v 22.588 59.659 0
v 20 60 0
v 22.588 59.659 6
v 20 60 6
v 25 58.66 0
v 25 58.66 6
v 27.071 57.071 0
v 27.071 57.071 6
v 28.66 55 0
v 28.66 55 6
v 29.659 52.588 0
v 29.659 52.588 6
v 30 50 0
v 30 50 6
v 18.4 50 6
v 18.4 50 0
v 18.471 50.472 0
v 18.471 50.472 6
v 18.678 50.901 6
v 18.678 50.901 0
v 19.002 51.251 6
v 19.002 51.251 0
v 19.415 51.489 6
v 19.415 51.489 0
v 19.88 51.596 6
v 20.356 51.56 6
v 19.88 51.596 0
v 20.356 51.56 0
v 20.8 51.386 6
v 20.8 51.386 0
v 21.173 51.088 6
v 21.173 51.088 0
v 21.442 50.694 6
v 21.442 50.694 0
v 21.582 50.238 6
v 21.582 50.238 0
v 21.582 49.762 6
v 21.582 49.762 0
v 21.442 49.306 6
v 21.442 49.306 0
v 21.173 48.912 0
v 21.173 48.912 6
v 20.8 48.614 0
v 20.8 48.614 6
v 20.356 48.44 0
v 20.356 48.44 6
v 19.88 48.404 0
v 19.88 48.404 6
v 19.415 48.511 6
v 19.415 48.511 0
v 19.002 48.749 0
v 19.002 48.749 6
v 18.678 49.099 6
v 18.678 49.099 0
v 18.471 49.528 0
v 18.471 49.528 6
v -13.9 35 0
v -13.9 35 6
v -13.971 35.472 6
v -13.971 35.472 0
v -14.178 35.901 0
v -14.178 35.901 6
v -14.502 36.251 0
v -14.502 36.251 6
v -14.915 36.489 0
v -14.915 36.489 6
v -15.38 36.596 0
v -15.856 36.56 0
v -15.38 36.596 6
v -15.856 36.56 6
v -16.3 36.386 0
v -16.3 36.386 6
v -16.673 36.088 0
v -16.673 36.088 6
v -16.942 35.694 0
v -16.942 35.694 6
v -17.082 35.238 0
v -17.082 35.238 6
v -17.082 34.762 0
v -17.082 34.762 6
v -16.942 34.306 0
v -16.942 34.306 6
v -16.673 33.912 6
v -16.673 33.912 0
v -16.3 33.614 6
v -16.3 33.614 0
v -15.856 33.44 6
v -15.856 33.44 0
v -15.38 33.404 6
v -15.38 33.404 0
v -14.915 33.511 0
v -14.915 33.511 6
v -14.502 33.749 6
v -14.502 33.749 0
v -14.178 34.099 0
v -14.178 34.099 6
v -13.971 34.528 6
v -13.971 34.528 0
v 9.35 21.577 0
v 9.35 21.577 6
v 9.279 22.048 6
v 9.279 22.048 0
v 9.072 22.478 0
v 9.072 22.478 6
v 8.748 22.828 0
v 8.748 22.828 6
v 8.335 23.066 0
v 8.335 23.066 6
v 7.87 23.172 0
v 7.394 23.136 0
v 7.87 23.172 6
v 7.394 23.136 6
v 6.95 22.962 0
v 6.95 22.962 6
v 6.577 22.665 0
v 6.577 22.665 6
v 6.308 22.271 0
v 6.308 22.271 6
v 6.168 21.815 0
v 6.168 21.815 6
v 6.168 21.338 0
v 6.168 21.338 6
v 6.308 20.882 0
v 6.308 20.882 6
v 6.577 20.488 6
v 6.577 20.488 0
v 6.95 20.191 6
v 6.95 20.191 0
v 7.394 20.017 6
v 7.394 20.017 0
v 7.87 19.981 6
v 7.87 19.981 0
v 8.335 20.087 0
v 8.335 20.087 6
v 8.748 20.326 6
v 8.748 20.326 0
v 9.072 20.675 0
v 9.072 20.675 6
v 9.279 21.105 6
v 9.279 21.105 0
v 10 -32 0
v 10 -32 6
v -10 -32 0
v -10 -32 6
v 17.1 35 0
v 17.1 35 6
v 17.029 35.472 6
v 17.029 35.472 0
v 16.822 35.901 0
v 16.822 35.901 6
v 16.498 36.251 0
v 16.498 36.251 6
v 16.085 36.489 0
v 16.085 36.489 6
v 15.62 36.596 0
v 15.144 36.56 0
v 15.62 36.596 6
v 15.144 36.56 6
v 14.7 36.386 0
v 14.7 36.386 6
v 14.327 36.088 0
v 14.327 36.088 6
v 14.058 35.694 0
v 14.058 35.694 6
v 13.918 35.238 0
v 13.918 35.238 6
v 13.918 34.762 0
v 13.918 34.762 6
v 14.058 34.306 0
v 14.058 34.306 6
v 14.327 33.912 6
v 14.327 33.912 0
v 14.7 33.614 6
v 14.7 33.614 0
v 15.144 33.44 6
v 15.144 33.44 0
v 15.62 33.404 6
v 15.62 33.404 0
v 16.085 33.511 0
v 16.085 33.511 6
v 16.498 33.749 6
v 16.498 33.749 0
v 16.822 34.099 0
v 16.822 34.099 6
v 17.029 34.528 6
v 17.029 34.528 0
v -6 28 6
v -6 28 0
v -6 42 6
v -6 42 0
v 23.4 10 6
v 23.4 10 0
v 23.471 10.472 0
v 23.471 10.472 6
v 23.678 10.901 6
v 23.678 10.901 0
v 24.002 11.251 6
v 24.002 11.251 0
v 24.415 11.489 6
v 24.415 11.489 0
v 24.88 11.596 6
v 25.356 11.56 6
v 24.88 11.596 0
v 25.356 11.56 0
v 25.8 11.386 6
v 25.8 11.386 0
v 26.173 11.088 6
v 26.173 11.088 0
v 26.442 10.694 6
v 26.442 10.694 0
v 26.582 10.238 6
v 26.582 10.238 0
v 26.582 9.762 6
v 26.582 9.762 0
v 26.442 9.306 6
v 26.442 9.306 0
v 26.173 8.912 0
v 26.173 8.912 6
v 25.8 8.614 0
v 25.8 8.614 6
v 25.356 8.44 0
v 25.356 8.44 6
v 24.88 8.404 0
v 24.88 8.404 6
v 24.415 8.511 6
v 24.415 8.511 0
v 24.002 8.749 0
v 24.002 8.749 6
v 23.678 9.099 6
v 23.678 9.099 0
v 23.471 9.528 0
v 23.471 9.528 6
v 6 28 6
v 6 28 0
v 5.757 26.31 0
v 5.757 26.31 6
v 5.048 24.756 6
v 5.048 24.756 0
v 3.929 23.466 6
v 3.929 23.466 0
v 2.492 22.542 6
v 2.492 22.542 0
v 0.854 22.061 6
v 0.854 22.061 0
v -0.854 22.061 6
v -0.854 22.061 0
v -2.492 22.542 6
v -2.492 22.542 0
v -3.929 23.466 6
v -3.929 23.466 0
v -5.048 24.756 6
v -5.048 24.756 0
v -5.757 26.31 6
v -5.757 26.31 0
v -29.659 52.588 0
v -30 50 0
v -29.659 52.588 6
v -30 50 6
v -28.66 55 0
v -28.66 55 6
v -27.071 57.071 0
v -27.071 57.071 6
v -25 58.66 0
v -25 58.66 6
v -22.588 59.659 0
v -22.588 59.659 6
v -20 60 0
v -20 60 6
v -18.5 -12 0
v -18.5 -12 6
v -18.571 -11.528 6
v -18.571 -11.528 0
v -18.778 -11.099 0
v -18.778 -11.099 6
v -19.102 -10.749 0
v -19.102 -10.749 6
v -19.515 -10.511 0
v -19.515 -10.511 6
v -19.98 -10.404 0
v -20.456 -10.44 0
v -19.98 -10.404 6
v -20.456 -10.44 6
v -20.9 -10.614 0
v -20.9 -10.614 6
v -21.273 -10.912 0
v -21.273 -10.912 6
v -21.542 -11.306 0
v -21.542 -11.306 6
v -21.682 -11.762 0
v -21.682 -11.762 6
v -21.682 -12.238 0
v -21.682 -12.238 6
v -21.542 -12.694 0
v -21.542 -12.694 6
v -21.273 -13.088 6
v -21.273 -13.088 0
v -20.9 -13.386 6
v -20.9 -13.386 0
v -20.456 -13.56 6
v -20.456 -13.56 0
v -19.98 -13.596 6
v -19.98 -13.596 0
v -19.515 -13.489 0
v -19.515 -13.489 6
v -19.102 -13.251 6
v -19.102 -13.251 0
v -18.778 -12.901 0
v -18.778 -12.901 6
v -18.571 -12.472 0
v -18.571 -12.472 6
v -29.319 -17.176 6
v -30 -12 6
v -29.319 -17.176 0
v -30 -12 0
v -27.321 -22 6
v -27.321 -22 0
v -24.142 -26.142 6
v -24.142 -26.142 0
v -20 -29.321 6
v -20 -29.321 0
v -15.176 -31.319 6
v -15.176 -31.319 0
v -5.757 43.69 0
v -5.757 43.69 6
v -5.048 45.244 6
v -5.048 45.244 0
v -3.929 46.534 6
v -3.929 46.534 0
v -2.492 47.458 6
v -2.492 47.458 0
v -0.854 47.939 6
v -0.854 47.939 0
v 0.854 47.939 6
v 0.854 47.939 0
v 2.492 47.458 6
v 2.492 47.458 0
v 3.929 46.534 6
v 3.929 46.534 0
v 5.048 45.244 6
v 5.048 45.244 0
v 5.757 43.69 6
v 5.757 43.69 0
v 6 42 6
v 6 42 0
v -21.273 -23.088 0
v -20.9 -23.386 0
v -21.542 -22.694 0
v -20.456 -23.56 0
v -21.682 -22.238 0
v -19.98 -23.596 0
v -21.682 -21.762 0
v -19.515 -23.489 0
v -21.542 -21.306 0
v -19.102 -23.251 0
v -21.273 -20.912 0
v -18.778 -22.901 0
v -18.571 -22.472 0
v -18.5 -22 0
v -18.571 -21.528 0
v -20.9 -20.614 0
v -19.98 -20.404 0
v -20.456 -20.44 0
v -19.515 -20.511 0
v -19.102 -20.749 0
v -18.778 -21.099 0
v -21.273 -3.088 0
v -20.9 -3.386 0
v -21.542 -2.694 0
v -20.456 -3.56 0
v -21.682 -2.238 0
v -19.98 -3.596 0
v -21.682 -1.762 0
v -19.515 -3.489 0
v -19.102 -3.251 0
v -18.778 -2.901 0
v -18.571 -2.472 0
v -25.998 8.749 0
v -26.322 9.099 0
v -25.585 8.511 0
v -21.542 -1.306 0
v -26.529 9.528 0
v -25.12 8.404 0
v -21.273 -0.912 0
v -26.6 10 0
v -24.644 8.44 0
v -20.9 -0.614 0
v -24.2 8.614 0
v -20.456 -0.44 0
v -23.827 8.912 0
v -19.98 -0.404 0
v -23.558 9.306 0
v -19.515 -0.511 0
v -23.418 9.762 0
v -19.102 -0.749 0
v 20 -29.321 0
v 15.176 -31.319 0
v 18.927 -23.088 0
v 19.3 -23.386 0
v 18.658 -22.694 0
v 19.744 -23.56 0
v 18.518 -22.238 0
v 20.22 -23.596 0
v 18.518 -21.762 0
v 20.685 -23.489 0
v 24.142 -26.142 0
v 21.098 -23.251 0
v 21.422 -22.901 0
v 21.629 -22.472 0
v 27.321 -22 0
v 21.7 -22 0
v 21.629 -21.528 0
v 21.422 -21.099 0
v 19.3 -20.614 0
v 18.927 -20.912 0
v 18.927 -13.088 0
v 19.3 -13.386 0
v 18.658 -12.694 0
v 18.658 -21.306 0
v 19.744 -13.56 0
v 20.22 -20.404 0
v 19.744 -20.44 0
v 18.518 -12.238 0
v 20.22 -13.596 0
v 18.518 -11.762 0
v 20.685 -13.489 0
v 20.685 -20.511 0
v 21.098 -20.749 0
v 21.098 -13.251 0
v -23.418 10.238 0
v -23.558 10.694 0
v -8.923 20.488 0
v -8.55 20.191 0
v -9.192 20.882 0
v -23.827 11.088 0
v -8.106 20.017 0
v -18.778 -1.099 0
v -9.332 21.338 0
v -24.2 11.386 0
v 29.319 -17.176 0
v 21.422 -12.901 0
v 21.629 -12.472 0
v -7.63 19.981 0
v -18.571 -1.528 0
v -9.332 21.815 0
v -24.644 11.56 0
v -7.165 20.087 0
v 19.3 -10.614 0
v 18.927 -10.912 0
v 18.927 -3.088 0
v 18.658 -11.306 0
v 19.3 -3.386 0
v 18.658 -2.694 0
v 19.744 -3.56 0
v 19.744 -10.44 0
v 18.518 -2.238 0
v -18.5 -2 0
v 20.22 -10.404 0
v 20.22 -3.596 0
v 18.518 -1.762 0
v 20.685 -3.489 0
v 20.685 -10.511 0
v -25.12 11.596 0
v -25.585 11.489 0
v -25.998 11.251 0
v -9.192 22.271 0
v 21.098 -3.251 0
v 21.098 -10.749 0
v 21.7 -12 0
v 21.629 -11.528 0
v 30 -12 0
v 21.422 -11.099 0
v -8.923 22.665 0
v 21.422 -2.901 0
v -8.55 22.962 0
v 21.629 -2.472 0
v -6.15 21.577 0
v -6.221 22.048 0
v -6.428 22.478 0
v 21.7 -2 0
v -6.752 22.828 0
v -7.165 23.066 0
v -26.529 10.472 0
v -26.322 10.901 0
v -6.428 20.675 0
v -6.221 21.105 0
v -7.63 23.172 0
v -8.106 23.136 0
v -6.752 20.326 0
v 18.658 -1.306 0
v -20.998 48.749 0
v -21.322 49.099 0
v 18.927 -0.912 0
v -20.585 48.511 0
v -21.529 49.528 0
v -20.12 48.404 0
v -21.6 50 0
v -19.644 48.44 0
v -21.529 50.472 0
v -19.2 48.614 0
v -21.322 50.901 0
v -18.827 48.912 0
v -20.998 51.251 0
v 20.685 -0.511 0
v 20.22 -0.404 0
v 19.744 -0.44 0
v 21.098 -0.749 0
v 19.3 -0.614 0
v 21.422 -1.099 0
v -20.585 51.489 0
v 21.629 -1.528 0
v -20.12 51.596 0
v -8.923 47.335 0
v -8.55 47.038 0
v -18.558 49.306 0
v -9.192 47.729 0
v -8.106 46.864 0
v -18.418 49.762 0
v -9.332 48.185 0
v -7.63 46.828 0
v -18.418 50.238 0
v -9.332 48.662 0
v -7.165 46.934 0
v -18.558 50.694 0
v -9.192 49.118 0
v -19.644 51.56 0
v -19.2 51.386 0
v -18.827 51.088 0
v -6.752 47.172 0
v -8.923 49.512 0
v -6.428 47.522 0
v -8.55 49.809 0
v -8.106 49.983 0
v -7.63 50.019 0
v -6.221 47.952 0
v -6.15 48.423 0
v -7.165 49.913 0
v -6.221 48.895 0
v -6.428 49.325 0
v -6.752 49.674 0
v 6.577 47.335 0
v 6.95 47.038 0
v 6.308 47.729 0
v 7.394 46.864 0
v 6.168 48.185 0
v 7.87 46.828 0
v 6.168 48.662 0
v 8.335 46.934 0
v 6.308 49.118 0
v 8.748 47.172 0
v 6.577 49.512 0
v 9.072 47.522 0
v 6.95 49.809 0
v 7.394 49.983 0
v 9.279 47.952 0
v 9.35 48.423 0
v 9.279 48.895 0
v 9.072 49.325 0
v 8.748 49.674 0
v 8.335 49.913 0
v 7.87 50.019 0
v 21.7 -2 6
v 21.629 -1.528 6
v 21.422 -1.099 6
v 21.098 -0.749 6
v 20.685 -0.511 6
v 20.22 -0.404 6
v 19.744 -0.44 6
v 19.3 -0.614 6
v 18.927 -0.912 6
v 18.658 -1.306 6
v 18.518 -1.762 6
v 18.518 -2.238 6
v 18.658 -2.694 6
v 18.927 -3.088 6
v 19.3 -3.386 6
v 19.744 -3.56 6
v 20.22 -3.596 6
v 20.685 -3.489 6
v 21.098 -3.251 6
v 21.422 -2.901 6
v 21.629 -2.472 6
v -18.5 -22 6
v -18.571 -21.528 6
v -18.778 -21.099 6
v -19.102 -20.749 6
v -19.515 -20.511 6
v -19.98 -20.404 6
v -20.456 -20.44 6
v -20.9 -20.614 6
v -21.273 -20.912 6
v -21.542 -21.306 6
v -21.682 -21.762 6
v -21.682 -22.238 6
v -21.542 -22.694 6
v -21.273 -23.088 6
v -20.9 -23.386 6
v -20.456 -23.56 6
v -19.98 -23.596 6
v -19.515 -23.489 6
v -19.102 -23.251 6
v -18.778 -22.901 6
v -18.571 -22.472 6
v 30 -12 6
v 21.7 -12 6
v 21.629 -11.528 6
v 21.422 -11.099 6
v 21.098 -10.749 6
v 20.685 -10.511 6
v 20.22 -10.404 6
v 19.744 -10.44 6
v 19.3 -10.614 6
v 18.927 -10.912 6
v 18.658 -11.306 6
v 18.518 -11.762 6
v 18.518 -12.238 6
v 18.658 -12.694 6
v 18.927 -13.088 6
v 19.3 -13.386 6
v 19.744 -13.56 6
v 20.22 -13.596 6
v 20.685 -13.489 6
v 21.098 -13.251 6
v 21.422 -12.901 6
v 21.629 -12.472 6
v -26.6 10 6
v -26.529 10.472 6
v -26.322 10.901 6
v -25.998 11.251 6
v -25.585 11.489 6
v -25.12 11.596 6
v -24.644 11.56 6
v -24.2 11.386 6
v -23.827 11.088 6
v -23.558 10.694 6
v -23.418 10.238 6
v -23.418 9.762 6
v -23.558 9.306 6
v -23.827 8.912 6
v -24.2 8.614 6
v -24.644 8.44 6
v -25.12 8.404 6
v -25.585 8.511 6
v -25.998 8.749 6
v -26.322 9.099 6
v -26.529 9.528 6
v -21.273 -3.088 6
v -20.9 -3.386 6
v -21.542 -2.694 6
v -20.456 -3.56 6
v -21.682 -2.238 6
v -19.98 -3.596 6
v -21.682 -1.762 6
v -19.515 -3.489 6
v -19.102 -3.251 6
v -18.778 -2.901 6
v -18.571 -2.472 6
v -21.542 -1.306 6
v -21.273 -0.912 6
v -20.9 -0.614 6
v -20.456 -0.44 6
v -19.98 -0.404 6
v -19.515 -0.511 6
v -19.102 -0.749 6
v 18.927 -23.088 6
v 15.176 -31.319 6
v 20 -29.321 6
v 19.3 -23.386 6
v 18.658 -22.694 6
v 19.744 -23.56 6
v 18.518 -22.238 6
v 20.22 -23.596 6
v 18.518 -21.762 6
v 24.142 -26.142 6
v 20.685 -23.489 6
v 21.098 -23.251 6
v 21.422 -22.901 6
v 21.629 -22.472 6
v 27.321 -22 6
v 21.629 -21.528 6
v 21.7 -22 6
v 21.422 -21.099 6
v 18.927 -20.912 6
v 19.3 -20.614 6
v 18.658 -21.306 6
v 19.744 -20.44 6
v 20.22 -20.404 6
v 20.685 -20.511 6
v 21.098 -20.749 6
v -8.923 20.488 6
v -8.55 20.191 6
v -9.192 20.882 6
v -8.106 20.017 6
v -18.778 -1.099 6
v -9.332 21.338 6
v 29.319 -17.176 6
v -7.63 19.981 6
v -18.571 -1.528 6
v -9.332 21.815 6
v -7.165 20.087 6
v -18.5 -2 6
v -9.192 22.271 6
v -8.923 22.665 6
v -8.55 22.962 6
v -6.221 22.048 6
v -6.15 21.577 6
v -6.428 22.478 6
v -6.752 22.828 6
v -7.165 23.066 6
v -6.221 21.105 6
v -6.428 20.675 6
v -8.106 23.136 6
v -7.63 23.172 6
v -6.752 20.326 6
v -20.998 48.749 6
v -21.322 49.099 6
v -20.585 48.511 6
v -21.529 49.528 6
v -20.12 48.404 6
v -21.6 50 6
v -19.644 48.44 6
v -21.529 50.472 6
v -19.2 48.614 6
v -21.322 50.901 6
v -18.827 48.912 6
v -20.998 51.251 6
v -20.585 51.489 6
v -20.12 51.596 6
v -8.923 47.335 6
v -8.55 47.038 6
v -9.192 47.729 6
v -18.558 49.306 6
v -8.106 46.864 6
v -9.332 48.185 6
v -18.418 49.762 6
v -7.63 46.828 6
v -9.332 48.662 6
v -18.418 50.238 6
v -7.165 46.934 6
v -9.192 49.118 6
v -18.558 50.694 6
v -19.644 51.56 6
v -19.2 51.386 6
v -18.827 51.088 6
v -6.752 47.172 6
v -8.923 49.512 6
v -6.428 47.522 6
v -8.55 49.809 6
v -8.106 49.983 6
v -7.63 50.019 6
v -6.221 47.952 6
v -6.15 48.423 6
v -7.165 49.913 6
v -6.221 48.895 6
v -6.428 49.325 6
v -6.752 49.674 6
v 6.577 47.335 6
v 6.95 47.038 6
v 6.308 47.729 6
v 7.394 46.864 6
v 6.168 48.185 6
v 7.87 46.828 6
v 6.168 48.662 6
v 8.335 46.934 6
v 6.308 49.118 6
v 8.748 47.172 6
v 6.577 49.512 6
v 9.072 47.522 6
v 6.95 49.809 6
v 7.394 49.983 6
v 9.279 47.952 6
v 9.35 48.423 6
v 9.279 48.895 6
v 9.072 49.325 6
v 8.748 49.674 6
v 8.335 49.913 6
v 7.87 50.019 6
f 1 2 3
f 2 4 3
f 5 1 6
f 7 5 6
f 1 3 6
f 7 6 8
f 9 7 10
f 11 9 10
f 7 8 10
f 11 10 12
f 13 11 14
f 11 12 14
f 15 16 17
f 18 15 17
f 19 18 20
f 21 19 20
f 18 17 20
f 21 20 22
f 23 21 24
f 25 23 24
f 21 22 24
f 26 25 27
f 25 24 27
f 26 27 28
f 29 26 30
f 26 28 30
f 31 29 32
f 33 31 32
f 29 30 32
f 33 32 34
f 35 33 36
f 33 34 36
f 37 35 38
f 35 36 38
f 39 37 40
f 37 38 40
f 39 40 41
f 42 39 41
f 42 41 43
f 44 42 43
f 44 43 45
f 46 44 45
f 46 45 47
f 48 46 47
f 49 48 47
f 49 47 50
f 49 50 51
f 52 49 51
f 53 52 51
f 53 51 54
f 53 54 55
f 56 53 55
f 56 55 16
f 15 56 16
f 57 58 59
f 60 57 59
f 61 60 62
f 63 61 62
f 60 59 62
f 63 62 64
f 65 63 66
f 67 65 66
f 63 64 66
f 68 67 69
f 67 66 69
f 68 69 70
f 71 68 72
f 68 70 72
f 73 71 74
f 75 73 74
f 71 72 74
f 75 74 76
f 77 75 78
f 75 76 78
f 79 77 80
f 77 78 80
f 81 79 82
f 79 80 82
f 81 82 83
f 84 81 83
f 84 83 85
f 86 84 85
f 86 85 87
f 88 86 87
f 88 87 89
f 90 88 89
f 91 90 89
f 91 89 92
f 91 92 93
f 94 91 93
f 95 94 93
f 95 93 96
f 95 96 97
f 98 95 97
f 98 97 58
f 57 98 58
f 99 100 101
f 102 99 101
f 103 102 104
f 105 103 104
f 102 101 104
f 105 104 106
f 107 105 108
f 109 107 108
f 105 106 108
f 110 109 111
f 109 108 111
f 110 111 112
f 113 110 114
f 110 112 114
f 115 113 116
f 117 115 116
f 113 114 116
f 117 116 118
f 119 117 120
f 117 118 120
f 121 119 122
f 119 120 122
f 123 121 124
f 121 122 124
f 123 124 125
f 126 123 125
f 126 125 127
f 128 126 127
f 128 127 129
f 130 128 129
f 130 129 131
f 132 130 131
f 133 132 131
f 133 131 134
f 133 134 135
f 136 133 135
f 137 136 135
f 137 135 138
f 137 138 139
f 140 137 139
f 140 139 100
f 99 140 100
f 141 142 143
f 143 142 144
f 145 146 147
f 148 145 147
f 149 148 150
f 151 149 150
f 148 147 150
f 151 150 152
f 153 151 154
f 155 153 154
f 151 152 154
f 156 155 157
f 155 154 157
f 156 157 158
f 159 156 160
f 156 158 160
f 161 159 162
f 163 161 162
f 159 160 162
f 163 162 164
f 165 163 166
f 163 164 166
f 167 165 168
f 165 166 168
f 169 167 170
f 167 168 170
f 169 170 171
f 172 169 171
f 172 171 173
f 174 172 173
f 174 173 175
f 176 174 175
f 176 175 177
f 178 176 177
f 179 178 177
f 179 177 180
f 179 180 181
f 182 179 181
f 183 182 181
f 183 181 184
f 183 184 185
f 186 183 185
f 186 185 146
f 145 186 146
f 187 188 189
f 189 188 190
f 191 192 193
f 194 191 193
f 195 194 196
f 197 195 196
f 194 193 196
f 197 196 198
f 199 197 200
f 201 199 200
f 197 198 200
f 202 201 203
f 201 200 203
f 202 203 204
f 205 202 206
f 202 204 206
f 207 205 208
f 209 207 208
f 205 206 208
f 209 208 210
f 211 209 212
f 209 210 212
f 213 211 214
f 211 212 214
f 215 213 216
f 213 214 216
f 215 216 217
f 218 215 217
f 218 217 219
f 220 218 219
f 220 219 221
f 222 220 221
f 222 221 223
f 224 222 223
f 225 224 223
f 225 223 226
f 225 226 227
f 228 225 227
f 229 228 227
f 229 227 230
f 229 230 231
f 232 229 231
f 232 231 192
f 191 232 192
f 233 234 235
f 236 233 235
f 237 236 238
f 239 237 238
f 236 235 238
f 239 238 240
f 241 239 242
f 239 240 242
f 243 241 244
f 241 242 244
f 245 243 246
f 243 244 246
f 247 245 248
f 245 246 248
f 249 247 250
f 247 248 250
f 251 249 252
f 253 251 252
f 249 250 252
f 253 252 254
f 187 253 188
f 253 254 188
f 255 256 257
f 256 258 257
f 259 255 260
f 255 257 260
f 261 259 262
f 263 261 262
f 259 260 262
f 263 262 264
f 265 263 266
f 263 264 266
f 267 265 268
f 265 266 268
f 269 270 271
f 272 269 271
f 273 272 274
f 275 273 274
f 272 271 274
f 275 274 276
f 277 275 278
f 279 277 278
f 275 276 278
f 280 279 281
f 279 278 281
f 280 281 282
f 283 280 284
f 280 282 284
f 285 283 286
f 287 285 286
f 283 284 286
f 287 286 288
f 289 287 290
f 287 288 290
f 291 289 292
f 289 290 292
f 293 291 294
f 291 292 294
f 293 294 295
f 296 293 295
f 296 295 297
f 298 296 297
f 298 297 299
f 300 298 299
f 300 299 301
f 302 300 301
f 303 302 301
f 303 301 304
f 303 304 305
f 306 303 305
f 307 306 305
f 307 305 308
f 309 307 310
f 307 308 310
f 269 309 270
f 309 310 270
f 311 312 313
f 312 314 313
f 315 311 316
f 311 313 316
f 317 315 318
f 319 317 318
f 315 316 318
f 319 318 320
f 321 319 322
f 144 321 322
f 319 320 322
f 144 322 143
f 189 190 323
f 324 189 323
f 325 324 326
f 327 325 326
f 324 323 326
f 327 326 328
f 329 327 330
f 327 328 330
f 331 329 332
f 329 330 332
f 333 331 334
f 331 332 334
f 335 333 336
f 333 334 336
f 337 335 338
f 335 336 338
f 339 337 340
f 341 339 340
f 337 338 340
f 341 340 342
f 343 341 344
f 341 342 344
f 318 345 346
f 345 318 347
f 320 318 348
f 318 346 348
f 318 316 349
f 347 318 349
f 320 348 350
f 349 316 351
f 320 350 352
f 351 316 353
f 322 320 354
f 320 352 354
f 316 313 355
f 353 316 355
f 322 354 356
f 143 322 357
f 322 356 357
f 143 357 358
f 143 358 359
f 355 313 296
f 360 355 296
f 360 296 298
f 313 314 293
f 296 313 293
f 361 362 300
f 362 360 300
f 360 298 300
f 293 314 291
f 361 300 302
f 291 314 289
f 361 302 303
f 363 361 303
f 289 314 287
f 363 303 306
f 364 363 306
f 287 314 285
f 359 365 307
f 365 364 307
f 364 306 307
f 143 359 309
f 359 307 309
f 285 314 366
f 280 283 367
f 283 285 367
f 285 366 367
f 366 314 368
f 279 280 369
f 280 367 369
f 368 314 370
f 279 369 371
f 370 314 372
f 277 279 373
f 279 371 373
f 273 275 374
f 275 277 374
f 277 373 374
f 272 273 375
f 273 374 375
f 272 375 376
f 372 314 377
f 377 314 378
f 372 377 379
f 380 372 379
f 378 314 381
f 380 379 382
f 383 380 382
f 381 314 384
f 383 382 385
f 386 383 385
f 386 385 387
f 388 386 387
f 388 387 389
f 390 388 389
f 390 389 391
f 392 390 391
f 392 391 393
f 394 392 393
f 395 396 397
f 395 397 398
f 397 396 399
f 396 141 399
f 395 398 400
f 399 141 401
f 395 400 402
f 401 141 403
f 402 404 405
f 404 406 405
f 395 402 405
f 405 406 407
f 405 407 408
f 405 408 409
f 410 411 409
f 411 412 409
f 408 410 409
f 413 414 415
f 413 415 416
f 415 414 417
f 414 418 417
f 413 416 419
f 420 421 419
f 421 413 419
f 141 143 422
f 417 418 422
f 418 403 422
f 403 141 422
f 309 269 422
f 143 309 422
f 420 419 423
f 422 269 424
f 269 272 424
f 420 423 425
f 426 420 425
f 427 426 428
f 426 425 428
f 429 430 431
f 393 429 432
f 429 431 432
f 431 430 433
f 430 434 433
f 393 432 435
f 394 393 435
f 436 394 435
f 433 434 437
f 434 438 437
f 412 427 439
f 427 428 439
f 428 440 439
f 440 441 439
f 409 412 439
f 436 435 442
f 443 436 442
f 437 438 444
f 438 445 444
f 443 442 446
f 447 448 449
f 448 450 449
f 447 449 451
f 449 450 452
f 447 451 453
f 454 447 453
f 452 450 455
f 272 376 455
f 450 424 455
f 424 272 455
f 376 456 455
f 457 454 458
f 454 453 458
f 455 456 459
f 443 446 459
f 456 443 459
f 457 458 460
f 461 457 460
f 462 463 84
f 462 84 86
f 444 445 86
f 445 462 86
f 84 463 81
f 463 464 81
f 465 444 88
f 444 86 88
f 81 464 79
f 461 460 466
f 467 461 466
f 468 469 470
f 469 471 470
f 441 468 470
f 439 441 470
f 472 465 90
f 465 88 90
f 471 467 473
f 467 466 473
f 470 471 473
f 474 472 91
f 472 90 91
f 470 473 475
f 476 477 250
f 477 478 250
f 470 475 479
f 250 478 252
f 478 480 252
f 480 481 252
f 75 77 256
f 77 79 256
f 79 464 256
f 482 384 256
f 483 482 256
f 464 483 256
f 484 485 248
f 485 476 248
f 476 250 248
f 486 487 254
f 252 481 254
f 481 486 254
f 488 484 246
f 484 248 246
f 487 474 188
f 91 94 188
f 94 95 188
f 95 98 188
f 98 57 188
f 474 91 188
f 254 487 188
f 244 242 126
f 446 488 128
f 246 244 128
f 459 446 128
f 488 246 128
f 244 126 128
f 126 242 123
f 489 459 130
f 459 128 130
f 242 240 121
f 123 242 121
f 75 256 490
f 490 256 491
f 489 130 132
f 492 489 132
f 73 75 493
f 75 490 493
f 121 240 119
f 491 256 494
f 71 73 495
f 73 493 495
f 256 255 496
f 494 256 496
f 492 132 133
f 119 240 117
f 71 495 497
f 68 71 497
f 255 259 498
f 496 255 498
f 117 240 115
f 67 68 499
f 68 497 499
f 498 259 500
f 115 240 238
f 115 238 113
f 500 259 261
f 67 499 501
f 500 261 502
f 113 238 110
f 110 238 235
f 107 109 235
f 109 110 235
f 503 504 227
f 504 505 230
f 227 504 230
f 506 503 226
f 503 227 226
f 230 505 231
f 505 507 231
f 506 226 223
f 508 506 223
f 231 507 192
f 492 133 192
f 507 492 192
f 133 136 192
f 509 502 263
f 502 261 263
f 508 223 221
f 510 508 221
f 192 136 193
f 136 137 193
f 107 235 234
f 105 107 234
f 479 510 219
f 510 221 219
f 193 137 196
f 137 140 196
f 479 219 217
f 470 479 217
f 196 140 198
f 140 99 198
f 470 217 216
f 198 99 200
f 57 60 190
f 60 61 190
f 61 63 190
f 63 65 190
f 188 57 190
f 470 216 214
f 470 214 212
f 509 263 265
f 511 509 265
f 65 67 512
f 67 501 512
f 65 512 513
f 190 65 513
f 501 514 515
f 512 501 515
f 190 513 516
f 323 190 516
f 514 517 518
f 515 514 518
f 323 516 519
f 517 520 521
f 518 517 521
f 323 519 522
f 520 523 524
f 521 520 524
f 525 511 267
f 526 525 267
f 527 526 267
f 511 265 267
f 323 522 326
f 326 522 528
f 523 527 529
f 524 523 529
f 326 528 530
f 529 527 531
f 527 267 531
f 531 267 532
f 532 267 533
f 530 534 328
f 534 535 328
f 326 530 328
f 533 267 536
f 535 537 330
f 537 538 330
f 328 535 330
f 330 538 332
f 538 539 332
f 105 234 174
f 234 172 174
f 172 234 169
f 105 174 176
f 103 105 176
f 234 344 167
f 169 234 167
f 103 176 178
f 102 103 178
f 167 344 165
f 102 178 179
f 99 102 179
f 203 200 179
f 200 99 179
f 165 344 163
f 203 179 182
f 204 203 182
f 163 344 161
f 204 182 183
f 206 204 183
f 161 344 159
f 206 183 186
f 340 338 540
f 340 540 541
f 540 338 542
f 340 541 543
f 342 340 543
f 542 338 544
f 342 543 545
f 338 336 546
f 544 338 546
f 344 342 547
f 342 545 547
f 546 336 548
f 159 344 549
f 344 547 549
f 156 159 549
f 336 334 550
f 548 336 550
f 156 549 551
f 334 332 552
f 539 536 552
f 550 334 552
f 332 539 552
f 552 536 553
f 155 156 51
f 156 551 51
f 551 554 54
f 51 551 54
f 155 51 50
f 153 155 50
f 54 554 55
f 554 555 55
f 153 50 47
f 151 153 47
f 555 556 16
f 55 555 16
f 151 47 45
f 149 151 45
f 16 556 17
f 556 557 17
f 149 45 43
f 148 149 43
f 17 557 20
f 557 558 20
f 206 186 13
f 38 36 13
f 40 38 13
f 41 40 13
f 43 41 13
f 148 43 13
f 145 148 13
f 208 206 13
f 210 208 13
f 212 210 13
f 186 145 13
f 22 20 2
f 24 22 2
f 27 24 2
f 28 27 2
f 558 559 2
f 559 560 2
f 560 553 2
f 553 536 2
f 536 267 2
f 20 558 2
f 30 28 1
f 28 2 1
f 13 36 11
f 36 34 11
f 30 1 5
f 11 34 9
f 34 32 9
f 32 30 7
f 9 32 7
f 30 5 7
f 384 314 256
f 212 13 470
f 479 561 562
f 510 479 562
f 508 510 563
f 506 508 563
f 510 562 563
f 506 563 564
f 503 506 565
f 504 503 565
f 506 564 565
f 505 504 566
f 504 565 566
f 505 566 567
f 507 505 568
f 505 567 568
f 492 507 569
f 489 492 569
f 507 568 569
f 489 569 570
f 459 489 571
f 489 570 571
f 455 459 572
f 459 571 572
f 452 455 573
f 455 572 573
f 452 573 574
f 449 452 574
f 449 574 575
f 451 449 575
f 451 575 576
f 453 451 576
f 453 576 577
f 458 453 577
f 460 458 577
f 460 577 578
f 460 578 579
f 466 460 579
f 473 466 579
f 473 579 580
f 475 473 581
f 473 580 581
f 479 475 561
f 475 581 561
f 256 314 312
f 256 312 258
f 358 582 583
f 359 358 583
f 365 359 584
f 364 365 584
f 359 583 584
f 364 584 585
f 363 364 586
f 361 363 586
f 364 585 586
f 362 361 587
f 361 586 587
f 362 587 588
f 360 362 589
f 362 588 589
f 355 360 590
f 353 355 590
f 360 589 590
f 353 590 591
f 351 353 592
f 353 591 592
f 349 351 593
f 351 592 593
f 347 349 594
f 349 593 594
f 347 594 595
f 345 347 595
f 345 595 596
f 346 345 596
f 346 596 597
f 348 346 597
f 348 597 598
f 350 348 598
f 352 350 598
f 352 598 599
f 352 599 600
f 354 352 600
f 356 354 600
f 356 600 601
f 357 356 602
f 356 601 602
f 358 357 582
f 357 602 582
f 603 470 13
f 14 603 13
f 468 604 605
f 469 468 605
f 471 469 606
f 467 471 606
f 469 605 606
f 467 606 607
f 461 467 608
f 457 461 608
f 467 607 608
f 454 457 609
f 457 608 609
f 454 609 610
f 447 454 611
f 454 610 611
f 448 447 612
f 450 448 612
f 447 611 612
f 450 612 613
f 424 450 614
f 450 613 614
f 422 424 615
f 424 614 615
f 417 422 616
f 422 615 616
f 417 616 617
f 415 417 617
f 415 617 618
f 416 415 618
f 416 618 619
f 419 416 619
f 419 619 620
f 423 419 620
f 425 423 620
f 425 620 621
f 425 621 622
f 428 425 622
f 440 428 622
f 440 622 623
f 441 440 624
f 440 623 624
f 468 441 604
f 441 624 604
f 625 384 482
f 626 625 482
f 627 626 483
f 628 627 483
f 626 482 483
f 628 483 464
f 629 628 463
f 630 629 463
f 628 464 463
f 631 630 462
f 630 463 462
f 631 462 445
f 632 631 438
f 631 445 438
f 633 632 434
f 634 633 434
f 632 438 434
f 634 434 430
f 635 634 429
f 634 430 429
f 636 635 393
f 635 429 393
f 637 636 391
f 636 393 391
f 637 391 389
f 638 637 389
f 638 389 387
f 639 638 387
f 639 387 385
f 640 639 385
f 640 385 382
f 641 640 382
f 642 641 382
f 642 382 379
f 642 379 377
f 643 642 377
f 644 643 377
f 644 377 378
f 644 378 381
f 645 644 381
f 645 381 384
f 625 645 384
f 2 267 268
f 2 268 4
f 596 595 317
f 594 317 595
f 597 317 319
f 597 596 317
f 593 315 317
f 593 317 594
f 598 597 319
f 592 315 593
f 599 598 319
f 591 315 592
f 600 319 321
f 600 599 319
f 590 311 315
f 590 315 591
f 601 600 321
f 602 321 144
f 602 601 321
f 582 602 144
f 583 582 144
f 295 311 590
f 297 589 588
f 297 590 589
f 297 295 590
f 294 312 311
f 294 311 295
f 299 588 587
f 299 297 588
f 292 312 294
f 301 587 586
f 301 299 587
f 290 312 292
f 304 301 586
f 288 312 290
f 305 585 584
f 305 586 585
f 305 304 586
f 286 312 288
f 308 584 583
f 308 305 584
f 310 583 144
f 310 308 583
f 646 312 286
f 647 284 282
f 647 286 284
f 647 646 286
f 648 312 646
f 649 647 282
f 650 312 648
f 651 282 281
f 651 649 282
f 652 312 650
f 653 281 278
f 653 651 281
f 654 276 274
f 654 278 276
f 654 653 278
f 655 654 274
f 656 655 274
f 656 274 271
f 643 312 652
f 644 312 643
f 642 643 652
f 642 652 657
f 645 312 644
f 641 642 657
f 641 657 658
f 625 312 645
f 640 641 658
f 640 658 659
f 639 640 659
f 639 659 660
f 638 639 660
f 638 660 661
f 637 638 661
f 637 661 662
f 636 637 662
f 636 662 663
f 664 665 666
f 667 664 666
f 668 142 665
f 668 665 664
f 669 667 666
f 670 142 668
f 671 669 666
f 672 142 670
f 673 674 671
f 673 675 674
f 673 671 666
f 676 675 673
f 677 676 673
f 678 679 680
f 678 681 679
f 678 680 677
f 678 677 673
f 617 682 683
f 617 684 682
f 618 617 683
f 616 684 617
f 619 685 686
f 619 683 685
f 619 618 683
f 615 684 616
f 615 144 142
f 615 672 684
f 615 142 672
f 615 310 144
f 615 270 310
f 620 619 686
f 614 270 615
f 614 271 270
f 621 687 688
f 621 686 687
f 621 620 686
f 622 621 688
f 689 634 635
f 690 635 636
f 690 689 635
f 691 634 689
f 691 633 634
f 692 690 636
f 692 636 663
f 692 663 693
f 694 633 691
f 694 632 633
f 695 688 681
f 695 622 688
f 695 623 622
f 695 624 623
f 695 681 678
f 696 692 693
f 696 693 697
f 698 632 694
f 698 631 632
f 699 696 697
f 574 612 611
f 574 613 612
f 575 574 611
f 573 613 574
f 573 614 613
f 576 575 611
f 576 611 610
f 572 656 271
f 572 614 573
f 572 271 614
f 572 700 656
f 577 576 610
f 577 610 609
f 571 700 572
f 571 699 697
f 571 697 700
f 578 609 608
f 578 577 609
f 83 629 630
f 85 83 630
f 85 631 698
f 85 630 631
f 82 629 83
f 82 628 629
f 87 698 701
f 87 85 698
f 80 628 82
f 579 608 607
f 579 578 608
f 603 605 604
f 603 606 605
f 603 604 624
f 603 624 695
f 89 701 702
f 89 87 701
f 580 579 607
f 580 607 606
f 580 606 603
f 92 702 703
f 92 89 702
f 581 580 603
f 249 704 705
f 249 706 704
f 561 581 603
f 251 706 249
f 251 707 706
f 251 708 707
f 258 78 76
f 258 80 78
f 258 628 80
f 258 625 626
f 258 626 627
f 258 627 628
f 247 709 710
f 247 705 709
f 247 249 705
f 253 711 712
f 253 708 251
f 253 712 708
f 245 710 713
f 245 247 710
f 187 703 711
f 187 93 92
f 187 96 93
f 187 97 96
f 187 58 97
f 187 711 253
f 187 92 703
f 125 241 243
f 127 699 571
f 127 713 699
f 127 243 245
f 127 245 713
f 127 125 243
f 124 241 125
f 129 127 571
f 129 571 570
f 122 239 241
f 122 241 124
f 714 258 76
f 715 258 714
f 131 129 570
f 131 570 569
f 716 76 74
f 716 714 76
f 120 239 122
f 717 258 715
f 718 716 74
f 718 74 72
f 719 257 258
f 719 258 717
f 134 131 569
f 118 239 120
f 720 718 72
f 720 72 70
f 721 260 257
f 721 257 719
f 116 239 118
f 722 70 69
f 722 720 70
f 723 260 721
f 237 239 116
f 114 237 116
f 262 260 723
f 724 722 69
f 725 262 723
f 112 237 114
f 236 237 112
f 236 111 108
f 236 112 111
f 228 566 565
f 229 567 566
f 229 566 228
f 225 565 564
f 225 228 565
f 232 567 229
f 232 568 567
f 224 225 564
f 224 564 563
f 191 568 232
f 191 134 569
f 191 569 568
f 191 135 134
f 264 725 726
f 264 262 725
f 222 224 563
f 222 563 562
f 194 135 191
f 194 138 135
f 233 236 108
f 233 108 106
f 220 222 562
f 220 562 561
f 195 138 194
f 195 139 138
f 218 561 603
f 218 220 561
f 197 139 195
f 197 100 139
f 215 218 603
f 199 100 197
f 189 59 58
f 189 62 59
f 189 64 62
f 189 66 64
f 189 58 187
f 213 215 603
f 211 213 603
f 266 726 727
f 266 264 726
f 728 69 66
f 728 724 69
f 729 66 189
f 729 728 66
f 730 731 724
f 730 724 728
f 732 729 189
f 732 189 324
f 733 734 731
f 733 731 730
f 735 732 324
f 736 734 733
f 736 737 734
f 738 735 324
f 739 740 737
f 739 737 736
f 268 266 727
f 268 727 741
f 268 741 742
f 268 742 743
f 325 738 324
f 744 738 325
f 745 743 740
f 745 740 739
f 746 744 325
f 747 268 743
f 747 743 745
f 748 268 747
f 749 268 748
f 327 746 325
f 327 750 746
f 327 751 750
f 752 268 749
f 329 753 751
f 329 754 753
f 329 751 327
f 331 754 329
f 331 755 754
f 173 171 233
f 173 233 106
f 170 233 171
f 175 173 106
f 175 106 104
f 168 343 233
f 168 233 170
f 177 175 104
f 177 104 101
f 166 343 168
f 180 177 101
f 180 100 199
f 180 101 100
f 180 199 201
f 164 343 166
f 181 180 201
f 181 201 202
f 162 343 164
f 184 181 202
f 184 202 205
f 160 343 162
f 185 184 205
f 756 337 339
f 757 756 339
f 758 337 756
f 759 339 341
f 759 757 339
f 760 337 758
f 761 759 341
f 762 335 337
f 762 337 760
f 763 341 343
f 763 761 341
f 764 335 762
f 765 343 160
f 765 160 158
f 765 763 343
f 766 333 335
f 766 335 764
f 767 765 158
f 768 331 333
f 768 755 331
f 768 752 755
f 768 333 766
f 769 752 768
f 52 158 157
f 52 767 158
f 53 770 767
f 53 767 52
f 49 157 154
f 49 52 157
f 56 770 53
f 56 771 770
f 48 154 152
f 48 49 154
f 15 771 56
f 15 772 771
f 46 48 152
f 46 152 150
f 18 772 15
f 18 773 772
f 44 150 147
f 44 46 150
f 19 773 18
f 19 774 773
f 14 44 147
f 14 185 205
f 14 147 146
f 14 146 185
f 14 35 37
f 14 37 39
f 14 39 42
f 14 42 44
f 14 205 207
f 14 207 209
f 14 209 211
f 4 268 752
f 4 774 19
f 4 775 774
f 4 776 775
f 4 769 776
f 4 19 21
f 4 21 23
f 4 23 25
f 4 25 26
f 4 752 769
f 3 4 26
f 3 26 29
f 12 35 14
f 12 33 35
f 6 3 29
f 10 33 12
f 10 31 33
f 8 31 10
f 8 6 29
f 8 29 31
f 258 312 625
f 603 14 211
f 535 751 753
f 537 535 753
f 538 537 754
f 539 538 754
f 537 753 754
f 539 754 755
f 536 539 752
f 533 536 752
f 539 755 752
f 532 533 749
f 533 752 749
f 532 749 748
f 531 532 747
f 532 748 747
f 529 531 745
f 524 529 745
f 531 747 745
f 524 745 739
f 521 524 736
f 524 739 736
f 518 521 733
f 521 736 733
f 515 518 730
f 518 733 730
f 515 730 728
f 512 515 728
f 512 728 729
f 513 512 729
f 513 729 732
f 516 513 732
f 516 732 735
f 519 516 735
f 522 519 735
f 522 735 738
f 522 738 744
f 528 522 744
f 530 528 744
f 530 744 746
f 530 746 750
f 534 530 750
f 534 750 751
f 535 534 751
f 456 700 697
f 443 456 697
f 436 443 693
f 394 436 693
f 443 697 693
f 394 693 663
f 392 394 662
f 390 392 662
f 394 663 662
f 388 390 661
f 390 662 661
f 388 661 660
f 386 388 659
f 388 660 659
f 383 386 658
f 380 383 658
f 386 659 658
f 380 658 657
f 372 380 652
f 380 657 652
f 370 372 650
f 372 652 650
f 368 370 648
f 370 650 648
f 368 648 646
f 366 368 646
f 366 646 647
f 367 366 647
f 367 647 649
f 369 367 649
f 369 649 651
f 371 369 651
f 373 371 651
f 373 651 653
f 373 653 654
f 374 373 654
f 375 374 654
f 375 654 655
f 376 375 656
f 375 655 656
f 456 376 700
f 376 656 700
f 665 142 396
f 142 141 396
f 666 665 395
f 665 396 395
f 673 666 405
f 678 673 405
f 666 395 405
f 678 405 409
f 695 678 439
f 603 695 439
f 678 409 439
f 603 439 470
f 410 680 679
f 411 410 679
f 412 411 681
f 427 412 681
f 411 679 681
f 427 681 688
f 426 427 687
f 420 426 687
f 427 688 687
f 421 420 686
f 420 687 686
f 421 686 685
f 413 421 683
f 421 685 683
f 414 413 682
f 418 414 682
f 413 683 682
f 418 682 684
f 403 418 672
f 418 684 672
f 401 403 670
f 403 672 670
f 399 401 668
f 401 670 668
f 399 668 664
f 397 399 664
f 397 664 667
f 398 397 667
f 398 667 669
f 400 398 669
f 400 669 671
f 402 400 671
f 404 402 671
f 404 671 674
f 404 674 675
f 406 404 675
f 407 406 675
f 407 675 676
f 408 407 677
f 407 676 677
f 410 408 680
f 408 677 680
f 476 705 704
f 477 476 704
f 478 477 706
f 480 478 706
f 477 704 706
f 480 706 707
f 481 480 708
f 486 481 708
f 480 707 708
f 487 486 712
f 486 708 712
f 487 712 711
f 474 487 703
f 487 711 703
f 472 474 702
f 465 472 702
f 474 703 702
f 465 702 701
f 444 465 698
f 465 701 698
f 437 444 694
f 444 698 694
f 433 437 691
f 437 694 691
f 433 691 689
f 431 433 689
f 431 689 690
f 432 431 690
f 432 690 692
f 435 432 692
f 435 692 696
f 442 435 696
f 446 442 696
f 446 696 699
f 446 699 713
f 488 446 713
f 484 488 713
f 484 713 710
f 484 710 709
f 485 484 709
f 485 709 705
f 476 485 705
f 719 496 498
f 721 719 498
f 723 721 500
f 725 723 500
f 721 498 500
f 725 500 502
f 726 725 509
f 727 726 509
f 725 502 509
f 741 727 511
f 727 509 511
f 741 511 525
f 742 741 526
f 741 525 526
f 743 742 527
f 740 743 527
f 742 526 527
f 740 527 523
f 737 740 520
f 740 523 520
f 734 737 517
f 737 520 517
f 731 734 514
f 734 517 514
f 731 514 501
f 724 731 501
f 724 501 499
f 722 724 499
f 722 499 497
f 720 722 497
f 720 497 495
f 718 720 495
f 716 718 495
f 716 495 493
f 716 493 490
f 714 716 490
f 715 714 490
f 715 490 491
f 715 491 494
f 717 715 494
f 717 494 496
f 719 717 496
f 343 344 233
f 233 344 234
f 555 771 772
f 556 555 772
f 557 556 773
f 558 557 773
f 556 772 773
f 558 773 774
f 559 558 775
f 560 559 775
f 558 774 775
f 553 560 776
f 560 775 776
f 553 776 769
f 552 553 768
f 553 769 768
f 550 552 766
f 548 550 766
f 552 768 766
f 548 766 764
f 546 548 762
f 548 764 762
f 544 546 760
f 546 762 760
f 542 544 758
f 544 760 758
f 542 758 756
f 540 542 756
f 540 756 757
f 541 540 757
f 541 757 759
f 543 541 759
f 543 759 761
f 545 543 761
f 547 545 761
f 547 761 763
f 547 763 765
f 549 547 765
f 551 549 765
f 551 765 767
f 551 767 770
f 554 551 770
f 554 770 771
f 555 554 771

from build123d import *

# Parameters (mm, degrees)
SKETCH_1_W          = 60
SKETCH_1_H          = 120
SKETCH_1_R          = 1.6
SKETCH_1_R_2        = 2.15
EXTRUDE_3_DEPTH     = 6
SKETCH_9_R          = 1.6
CUT_EXTRUDE_1_DEPTH = 6
FILLET_1_R          = 10
SKETCH_11_R         = 2.15
CUT_EXTRUDE_2_DEPTH = 6
FILLET_2_R          = 20
SKETCH_12_R         = 1.6
CUT_EXTRUDE_3_DEPTH = 10
SKETCH_13_R         = 1.6
CUT_EXTRUDE_4_DEPTH = 10
EXTRUDE_START       = -6
SKETCH_14_R         = 1.6
EXTRUDE_5_DEPTH     = 6


with BuildPart() as part:
    # 草图1 → 凸台-拉伸3 (new body)
    with BuildSketch(Plane.XY):
        Rectangle(SKETCH_1_W, SKETCH_1_H)
        with Locations((0, 50.5)):
            Circle(SKETCH_1_R, mode=Mode.SUBTRACT)
        with Locations((20, -50)):
            Circle(SKETCH_1_R_2, mode=Mode.SUBTRACT)
        with Locations((-20, -50)):
            Circle(SKETCH_1_R_2, mode=Mode.SUBTRACT)
        with Locations((13.423393759, 42.75)):
            Circle(SKETCH_1_R, mode=Mode.SUBTRACT)
        with Locations((13.423393759, 27.25)):
            Circle(SKETCH_1_R, mode=Mode.SUBTRACT)
        with Locations((0, 19.5)):
            Circle(SKETCH_1_R, mode=Mode.SUBTRACT)
        with Locations((-13.423393759, 27.25)):
            Circle(SKETCH_1_R, mode=Mode.SUBTRACT)
        with Locations((-13.423393759, 42.75)):
            Circle(SKETCH_1_R, mode=Mode.SUBTRACT)
        with BuildLine():
            Line((6, 42), (6, 28))
            ThreePointArc((6, 28), (0, 22), (-6, 28))
            Line((-6, 28), (-6, 42))
            ThreePointArc((-6, 42), (0, 48), (6, 42))
        make_face(mode=Mode.SUBTRACT)
    extrude(amount=EXTRUDE_3_DEPTH)

    # 草图9 → 切除-拉伸1 (cut)
    with BuildSketch(Plane.XY.offset(6)):
        with Locations((20.1, -22)):
            Circle(SKETCH_9_R)
        with Locations((20.1, -2)):
            Circle(SKETCH_9_R)
        with Locations((20.1, -12)):
            Circle(SKETCH_9_R)
        with Locations((-20.1, -2)):
            Circle(SKETCH_9_R)
        with Locations((-20.1, -12)):
            Circle(SKETCH_9_R)
        with Locations((-20.1, -22)):
            Circle(SKETCH_9_R)
    extrude(amount=-CUT_EXTRUDE_1_DEPTH, mode=Mode.SUBTRACT)

    # 圆角1
    fillet_1_edges = [part.edges().sort_by_distance(p)[0] for p in [
        (30, -60, 3),
        (-30, -60, 3),
        (-30, 60, 3),
        (30, 60, 3),
    ]]
    fillet(fillet_1_edges, radius=FILLET_1_R)

    # 草图11 → 切除-拉伸2 (cut)
    with BuildSketch(Plane.XY.offset(6)):
        with BuildLine():
            Line((30, -32), (-30, -32))
            Line((-30, -32), (-30, -50))
            ThreePointArc((-30, -50), (-27.071067812, -57.071067812), (-20, -60))
            Line((-20, -60), (20, -60))
            ThreePointArc((20, -60), (27.071067812, -57.071067812), (30, -50))
            Line((30, -50), (30, -32))
        make_face()
        with Locations((-20, -50)):
            Circle(SKETCH_11_R, mode=Mode.SUBTRACT)
        with Locations((20, -50)):
            Circle(SKETCH_11_R, mode=Mode.SUBTRACT)
    extrude(amount=-CUT_EXTRUDE_2_DEPTH, mode=Mode.SUBTRACT)

    # 圆角2
    fillet_2_edges = [part.edges().sort_by_distance(p)[0] for p in [
        (-30, -32, 3),
        (30, -32, 3),
    ]]
    fillet(fillet_2_edges, radius=FILLET_2_R)

    # 草图12 → 切除-拉伸3 (cut)
    with BuildSketch(Plane(origin=(0, 0, 0), x_dir=(-1, 0, 0), z_dir=(0, 0, -1))):
        with Locations((-20, 50)):
            Circle(SKETCH_12_R)
        with Locations((20, 50)):
            Circle(SKETCH_12_R)
        with Locations((25, 10)):
            Circle(SKETCH_12_R)
        with Locations((-25, 10)):
            Circle(SKETCH_12_R)
    extrude(amount=-CUT_EXTRUDE_3_DEPTH, mode=Mode.SUBTRACT)

    # 草图13 → 切除-拉伸4 (cut)
    with BuildSketch(Plane.XY.offset(6)):
        with Locations((-15.5, 35)):
            Circle(SKETCH_13_R)
        with Locations((-7.75, 48.423393759)):
            Circle(SKETCH_13_R)
        with Locations((7.75, 48.423393759)):
            Circle(SKETCH_13_R)
        with Locations((15.5, 35)):
            Circle(SKETCH_13_R)
        with Locations((7.75, 21.576606241)):
            Circle(SKETCH_13_R)
        with Locations((-7.75, 21.576606241)):
            Circle(SKETCH_13_R)
    extrude(amount=-CUT_EXTRUDE_4_DEPTH, mode=Mode.SUBTRACT)

    # 草图14 → 凸台-拉伸5 (add)
    with BuildSketch(Plane.XY.offset(6).offset(EXTRUDE_START)):
        with Locations((0, 50.5)):
            Circle(SKETCH_14_R)
        with Locations((13.423393759, 42.75)):
            Circle(SKETCH_14_R)
        with Locations((13.423393759, 27.25)):
            Circle(SKETCH_14_R)
        with Locations((0, 19.5)):
            Circle(SKETCH_14_R)
        with Locations((-13.423393759, 27.25)):
            Circle(SKETCH_14_R)
        with Locations((-13.423393759, 42.75)):
            Circle(SKETCH_14_R)
    extrude(amount=EXTRUDE_5_DEPTH)


solid = part.part
